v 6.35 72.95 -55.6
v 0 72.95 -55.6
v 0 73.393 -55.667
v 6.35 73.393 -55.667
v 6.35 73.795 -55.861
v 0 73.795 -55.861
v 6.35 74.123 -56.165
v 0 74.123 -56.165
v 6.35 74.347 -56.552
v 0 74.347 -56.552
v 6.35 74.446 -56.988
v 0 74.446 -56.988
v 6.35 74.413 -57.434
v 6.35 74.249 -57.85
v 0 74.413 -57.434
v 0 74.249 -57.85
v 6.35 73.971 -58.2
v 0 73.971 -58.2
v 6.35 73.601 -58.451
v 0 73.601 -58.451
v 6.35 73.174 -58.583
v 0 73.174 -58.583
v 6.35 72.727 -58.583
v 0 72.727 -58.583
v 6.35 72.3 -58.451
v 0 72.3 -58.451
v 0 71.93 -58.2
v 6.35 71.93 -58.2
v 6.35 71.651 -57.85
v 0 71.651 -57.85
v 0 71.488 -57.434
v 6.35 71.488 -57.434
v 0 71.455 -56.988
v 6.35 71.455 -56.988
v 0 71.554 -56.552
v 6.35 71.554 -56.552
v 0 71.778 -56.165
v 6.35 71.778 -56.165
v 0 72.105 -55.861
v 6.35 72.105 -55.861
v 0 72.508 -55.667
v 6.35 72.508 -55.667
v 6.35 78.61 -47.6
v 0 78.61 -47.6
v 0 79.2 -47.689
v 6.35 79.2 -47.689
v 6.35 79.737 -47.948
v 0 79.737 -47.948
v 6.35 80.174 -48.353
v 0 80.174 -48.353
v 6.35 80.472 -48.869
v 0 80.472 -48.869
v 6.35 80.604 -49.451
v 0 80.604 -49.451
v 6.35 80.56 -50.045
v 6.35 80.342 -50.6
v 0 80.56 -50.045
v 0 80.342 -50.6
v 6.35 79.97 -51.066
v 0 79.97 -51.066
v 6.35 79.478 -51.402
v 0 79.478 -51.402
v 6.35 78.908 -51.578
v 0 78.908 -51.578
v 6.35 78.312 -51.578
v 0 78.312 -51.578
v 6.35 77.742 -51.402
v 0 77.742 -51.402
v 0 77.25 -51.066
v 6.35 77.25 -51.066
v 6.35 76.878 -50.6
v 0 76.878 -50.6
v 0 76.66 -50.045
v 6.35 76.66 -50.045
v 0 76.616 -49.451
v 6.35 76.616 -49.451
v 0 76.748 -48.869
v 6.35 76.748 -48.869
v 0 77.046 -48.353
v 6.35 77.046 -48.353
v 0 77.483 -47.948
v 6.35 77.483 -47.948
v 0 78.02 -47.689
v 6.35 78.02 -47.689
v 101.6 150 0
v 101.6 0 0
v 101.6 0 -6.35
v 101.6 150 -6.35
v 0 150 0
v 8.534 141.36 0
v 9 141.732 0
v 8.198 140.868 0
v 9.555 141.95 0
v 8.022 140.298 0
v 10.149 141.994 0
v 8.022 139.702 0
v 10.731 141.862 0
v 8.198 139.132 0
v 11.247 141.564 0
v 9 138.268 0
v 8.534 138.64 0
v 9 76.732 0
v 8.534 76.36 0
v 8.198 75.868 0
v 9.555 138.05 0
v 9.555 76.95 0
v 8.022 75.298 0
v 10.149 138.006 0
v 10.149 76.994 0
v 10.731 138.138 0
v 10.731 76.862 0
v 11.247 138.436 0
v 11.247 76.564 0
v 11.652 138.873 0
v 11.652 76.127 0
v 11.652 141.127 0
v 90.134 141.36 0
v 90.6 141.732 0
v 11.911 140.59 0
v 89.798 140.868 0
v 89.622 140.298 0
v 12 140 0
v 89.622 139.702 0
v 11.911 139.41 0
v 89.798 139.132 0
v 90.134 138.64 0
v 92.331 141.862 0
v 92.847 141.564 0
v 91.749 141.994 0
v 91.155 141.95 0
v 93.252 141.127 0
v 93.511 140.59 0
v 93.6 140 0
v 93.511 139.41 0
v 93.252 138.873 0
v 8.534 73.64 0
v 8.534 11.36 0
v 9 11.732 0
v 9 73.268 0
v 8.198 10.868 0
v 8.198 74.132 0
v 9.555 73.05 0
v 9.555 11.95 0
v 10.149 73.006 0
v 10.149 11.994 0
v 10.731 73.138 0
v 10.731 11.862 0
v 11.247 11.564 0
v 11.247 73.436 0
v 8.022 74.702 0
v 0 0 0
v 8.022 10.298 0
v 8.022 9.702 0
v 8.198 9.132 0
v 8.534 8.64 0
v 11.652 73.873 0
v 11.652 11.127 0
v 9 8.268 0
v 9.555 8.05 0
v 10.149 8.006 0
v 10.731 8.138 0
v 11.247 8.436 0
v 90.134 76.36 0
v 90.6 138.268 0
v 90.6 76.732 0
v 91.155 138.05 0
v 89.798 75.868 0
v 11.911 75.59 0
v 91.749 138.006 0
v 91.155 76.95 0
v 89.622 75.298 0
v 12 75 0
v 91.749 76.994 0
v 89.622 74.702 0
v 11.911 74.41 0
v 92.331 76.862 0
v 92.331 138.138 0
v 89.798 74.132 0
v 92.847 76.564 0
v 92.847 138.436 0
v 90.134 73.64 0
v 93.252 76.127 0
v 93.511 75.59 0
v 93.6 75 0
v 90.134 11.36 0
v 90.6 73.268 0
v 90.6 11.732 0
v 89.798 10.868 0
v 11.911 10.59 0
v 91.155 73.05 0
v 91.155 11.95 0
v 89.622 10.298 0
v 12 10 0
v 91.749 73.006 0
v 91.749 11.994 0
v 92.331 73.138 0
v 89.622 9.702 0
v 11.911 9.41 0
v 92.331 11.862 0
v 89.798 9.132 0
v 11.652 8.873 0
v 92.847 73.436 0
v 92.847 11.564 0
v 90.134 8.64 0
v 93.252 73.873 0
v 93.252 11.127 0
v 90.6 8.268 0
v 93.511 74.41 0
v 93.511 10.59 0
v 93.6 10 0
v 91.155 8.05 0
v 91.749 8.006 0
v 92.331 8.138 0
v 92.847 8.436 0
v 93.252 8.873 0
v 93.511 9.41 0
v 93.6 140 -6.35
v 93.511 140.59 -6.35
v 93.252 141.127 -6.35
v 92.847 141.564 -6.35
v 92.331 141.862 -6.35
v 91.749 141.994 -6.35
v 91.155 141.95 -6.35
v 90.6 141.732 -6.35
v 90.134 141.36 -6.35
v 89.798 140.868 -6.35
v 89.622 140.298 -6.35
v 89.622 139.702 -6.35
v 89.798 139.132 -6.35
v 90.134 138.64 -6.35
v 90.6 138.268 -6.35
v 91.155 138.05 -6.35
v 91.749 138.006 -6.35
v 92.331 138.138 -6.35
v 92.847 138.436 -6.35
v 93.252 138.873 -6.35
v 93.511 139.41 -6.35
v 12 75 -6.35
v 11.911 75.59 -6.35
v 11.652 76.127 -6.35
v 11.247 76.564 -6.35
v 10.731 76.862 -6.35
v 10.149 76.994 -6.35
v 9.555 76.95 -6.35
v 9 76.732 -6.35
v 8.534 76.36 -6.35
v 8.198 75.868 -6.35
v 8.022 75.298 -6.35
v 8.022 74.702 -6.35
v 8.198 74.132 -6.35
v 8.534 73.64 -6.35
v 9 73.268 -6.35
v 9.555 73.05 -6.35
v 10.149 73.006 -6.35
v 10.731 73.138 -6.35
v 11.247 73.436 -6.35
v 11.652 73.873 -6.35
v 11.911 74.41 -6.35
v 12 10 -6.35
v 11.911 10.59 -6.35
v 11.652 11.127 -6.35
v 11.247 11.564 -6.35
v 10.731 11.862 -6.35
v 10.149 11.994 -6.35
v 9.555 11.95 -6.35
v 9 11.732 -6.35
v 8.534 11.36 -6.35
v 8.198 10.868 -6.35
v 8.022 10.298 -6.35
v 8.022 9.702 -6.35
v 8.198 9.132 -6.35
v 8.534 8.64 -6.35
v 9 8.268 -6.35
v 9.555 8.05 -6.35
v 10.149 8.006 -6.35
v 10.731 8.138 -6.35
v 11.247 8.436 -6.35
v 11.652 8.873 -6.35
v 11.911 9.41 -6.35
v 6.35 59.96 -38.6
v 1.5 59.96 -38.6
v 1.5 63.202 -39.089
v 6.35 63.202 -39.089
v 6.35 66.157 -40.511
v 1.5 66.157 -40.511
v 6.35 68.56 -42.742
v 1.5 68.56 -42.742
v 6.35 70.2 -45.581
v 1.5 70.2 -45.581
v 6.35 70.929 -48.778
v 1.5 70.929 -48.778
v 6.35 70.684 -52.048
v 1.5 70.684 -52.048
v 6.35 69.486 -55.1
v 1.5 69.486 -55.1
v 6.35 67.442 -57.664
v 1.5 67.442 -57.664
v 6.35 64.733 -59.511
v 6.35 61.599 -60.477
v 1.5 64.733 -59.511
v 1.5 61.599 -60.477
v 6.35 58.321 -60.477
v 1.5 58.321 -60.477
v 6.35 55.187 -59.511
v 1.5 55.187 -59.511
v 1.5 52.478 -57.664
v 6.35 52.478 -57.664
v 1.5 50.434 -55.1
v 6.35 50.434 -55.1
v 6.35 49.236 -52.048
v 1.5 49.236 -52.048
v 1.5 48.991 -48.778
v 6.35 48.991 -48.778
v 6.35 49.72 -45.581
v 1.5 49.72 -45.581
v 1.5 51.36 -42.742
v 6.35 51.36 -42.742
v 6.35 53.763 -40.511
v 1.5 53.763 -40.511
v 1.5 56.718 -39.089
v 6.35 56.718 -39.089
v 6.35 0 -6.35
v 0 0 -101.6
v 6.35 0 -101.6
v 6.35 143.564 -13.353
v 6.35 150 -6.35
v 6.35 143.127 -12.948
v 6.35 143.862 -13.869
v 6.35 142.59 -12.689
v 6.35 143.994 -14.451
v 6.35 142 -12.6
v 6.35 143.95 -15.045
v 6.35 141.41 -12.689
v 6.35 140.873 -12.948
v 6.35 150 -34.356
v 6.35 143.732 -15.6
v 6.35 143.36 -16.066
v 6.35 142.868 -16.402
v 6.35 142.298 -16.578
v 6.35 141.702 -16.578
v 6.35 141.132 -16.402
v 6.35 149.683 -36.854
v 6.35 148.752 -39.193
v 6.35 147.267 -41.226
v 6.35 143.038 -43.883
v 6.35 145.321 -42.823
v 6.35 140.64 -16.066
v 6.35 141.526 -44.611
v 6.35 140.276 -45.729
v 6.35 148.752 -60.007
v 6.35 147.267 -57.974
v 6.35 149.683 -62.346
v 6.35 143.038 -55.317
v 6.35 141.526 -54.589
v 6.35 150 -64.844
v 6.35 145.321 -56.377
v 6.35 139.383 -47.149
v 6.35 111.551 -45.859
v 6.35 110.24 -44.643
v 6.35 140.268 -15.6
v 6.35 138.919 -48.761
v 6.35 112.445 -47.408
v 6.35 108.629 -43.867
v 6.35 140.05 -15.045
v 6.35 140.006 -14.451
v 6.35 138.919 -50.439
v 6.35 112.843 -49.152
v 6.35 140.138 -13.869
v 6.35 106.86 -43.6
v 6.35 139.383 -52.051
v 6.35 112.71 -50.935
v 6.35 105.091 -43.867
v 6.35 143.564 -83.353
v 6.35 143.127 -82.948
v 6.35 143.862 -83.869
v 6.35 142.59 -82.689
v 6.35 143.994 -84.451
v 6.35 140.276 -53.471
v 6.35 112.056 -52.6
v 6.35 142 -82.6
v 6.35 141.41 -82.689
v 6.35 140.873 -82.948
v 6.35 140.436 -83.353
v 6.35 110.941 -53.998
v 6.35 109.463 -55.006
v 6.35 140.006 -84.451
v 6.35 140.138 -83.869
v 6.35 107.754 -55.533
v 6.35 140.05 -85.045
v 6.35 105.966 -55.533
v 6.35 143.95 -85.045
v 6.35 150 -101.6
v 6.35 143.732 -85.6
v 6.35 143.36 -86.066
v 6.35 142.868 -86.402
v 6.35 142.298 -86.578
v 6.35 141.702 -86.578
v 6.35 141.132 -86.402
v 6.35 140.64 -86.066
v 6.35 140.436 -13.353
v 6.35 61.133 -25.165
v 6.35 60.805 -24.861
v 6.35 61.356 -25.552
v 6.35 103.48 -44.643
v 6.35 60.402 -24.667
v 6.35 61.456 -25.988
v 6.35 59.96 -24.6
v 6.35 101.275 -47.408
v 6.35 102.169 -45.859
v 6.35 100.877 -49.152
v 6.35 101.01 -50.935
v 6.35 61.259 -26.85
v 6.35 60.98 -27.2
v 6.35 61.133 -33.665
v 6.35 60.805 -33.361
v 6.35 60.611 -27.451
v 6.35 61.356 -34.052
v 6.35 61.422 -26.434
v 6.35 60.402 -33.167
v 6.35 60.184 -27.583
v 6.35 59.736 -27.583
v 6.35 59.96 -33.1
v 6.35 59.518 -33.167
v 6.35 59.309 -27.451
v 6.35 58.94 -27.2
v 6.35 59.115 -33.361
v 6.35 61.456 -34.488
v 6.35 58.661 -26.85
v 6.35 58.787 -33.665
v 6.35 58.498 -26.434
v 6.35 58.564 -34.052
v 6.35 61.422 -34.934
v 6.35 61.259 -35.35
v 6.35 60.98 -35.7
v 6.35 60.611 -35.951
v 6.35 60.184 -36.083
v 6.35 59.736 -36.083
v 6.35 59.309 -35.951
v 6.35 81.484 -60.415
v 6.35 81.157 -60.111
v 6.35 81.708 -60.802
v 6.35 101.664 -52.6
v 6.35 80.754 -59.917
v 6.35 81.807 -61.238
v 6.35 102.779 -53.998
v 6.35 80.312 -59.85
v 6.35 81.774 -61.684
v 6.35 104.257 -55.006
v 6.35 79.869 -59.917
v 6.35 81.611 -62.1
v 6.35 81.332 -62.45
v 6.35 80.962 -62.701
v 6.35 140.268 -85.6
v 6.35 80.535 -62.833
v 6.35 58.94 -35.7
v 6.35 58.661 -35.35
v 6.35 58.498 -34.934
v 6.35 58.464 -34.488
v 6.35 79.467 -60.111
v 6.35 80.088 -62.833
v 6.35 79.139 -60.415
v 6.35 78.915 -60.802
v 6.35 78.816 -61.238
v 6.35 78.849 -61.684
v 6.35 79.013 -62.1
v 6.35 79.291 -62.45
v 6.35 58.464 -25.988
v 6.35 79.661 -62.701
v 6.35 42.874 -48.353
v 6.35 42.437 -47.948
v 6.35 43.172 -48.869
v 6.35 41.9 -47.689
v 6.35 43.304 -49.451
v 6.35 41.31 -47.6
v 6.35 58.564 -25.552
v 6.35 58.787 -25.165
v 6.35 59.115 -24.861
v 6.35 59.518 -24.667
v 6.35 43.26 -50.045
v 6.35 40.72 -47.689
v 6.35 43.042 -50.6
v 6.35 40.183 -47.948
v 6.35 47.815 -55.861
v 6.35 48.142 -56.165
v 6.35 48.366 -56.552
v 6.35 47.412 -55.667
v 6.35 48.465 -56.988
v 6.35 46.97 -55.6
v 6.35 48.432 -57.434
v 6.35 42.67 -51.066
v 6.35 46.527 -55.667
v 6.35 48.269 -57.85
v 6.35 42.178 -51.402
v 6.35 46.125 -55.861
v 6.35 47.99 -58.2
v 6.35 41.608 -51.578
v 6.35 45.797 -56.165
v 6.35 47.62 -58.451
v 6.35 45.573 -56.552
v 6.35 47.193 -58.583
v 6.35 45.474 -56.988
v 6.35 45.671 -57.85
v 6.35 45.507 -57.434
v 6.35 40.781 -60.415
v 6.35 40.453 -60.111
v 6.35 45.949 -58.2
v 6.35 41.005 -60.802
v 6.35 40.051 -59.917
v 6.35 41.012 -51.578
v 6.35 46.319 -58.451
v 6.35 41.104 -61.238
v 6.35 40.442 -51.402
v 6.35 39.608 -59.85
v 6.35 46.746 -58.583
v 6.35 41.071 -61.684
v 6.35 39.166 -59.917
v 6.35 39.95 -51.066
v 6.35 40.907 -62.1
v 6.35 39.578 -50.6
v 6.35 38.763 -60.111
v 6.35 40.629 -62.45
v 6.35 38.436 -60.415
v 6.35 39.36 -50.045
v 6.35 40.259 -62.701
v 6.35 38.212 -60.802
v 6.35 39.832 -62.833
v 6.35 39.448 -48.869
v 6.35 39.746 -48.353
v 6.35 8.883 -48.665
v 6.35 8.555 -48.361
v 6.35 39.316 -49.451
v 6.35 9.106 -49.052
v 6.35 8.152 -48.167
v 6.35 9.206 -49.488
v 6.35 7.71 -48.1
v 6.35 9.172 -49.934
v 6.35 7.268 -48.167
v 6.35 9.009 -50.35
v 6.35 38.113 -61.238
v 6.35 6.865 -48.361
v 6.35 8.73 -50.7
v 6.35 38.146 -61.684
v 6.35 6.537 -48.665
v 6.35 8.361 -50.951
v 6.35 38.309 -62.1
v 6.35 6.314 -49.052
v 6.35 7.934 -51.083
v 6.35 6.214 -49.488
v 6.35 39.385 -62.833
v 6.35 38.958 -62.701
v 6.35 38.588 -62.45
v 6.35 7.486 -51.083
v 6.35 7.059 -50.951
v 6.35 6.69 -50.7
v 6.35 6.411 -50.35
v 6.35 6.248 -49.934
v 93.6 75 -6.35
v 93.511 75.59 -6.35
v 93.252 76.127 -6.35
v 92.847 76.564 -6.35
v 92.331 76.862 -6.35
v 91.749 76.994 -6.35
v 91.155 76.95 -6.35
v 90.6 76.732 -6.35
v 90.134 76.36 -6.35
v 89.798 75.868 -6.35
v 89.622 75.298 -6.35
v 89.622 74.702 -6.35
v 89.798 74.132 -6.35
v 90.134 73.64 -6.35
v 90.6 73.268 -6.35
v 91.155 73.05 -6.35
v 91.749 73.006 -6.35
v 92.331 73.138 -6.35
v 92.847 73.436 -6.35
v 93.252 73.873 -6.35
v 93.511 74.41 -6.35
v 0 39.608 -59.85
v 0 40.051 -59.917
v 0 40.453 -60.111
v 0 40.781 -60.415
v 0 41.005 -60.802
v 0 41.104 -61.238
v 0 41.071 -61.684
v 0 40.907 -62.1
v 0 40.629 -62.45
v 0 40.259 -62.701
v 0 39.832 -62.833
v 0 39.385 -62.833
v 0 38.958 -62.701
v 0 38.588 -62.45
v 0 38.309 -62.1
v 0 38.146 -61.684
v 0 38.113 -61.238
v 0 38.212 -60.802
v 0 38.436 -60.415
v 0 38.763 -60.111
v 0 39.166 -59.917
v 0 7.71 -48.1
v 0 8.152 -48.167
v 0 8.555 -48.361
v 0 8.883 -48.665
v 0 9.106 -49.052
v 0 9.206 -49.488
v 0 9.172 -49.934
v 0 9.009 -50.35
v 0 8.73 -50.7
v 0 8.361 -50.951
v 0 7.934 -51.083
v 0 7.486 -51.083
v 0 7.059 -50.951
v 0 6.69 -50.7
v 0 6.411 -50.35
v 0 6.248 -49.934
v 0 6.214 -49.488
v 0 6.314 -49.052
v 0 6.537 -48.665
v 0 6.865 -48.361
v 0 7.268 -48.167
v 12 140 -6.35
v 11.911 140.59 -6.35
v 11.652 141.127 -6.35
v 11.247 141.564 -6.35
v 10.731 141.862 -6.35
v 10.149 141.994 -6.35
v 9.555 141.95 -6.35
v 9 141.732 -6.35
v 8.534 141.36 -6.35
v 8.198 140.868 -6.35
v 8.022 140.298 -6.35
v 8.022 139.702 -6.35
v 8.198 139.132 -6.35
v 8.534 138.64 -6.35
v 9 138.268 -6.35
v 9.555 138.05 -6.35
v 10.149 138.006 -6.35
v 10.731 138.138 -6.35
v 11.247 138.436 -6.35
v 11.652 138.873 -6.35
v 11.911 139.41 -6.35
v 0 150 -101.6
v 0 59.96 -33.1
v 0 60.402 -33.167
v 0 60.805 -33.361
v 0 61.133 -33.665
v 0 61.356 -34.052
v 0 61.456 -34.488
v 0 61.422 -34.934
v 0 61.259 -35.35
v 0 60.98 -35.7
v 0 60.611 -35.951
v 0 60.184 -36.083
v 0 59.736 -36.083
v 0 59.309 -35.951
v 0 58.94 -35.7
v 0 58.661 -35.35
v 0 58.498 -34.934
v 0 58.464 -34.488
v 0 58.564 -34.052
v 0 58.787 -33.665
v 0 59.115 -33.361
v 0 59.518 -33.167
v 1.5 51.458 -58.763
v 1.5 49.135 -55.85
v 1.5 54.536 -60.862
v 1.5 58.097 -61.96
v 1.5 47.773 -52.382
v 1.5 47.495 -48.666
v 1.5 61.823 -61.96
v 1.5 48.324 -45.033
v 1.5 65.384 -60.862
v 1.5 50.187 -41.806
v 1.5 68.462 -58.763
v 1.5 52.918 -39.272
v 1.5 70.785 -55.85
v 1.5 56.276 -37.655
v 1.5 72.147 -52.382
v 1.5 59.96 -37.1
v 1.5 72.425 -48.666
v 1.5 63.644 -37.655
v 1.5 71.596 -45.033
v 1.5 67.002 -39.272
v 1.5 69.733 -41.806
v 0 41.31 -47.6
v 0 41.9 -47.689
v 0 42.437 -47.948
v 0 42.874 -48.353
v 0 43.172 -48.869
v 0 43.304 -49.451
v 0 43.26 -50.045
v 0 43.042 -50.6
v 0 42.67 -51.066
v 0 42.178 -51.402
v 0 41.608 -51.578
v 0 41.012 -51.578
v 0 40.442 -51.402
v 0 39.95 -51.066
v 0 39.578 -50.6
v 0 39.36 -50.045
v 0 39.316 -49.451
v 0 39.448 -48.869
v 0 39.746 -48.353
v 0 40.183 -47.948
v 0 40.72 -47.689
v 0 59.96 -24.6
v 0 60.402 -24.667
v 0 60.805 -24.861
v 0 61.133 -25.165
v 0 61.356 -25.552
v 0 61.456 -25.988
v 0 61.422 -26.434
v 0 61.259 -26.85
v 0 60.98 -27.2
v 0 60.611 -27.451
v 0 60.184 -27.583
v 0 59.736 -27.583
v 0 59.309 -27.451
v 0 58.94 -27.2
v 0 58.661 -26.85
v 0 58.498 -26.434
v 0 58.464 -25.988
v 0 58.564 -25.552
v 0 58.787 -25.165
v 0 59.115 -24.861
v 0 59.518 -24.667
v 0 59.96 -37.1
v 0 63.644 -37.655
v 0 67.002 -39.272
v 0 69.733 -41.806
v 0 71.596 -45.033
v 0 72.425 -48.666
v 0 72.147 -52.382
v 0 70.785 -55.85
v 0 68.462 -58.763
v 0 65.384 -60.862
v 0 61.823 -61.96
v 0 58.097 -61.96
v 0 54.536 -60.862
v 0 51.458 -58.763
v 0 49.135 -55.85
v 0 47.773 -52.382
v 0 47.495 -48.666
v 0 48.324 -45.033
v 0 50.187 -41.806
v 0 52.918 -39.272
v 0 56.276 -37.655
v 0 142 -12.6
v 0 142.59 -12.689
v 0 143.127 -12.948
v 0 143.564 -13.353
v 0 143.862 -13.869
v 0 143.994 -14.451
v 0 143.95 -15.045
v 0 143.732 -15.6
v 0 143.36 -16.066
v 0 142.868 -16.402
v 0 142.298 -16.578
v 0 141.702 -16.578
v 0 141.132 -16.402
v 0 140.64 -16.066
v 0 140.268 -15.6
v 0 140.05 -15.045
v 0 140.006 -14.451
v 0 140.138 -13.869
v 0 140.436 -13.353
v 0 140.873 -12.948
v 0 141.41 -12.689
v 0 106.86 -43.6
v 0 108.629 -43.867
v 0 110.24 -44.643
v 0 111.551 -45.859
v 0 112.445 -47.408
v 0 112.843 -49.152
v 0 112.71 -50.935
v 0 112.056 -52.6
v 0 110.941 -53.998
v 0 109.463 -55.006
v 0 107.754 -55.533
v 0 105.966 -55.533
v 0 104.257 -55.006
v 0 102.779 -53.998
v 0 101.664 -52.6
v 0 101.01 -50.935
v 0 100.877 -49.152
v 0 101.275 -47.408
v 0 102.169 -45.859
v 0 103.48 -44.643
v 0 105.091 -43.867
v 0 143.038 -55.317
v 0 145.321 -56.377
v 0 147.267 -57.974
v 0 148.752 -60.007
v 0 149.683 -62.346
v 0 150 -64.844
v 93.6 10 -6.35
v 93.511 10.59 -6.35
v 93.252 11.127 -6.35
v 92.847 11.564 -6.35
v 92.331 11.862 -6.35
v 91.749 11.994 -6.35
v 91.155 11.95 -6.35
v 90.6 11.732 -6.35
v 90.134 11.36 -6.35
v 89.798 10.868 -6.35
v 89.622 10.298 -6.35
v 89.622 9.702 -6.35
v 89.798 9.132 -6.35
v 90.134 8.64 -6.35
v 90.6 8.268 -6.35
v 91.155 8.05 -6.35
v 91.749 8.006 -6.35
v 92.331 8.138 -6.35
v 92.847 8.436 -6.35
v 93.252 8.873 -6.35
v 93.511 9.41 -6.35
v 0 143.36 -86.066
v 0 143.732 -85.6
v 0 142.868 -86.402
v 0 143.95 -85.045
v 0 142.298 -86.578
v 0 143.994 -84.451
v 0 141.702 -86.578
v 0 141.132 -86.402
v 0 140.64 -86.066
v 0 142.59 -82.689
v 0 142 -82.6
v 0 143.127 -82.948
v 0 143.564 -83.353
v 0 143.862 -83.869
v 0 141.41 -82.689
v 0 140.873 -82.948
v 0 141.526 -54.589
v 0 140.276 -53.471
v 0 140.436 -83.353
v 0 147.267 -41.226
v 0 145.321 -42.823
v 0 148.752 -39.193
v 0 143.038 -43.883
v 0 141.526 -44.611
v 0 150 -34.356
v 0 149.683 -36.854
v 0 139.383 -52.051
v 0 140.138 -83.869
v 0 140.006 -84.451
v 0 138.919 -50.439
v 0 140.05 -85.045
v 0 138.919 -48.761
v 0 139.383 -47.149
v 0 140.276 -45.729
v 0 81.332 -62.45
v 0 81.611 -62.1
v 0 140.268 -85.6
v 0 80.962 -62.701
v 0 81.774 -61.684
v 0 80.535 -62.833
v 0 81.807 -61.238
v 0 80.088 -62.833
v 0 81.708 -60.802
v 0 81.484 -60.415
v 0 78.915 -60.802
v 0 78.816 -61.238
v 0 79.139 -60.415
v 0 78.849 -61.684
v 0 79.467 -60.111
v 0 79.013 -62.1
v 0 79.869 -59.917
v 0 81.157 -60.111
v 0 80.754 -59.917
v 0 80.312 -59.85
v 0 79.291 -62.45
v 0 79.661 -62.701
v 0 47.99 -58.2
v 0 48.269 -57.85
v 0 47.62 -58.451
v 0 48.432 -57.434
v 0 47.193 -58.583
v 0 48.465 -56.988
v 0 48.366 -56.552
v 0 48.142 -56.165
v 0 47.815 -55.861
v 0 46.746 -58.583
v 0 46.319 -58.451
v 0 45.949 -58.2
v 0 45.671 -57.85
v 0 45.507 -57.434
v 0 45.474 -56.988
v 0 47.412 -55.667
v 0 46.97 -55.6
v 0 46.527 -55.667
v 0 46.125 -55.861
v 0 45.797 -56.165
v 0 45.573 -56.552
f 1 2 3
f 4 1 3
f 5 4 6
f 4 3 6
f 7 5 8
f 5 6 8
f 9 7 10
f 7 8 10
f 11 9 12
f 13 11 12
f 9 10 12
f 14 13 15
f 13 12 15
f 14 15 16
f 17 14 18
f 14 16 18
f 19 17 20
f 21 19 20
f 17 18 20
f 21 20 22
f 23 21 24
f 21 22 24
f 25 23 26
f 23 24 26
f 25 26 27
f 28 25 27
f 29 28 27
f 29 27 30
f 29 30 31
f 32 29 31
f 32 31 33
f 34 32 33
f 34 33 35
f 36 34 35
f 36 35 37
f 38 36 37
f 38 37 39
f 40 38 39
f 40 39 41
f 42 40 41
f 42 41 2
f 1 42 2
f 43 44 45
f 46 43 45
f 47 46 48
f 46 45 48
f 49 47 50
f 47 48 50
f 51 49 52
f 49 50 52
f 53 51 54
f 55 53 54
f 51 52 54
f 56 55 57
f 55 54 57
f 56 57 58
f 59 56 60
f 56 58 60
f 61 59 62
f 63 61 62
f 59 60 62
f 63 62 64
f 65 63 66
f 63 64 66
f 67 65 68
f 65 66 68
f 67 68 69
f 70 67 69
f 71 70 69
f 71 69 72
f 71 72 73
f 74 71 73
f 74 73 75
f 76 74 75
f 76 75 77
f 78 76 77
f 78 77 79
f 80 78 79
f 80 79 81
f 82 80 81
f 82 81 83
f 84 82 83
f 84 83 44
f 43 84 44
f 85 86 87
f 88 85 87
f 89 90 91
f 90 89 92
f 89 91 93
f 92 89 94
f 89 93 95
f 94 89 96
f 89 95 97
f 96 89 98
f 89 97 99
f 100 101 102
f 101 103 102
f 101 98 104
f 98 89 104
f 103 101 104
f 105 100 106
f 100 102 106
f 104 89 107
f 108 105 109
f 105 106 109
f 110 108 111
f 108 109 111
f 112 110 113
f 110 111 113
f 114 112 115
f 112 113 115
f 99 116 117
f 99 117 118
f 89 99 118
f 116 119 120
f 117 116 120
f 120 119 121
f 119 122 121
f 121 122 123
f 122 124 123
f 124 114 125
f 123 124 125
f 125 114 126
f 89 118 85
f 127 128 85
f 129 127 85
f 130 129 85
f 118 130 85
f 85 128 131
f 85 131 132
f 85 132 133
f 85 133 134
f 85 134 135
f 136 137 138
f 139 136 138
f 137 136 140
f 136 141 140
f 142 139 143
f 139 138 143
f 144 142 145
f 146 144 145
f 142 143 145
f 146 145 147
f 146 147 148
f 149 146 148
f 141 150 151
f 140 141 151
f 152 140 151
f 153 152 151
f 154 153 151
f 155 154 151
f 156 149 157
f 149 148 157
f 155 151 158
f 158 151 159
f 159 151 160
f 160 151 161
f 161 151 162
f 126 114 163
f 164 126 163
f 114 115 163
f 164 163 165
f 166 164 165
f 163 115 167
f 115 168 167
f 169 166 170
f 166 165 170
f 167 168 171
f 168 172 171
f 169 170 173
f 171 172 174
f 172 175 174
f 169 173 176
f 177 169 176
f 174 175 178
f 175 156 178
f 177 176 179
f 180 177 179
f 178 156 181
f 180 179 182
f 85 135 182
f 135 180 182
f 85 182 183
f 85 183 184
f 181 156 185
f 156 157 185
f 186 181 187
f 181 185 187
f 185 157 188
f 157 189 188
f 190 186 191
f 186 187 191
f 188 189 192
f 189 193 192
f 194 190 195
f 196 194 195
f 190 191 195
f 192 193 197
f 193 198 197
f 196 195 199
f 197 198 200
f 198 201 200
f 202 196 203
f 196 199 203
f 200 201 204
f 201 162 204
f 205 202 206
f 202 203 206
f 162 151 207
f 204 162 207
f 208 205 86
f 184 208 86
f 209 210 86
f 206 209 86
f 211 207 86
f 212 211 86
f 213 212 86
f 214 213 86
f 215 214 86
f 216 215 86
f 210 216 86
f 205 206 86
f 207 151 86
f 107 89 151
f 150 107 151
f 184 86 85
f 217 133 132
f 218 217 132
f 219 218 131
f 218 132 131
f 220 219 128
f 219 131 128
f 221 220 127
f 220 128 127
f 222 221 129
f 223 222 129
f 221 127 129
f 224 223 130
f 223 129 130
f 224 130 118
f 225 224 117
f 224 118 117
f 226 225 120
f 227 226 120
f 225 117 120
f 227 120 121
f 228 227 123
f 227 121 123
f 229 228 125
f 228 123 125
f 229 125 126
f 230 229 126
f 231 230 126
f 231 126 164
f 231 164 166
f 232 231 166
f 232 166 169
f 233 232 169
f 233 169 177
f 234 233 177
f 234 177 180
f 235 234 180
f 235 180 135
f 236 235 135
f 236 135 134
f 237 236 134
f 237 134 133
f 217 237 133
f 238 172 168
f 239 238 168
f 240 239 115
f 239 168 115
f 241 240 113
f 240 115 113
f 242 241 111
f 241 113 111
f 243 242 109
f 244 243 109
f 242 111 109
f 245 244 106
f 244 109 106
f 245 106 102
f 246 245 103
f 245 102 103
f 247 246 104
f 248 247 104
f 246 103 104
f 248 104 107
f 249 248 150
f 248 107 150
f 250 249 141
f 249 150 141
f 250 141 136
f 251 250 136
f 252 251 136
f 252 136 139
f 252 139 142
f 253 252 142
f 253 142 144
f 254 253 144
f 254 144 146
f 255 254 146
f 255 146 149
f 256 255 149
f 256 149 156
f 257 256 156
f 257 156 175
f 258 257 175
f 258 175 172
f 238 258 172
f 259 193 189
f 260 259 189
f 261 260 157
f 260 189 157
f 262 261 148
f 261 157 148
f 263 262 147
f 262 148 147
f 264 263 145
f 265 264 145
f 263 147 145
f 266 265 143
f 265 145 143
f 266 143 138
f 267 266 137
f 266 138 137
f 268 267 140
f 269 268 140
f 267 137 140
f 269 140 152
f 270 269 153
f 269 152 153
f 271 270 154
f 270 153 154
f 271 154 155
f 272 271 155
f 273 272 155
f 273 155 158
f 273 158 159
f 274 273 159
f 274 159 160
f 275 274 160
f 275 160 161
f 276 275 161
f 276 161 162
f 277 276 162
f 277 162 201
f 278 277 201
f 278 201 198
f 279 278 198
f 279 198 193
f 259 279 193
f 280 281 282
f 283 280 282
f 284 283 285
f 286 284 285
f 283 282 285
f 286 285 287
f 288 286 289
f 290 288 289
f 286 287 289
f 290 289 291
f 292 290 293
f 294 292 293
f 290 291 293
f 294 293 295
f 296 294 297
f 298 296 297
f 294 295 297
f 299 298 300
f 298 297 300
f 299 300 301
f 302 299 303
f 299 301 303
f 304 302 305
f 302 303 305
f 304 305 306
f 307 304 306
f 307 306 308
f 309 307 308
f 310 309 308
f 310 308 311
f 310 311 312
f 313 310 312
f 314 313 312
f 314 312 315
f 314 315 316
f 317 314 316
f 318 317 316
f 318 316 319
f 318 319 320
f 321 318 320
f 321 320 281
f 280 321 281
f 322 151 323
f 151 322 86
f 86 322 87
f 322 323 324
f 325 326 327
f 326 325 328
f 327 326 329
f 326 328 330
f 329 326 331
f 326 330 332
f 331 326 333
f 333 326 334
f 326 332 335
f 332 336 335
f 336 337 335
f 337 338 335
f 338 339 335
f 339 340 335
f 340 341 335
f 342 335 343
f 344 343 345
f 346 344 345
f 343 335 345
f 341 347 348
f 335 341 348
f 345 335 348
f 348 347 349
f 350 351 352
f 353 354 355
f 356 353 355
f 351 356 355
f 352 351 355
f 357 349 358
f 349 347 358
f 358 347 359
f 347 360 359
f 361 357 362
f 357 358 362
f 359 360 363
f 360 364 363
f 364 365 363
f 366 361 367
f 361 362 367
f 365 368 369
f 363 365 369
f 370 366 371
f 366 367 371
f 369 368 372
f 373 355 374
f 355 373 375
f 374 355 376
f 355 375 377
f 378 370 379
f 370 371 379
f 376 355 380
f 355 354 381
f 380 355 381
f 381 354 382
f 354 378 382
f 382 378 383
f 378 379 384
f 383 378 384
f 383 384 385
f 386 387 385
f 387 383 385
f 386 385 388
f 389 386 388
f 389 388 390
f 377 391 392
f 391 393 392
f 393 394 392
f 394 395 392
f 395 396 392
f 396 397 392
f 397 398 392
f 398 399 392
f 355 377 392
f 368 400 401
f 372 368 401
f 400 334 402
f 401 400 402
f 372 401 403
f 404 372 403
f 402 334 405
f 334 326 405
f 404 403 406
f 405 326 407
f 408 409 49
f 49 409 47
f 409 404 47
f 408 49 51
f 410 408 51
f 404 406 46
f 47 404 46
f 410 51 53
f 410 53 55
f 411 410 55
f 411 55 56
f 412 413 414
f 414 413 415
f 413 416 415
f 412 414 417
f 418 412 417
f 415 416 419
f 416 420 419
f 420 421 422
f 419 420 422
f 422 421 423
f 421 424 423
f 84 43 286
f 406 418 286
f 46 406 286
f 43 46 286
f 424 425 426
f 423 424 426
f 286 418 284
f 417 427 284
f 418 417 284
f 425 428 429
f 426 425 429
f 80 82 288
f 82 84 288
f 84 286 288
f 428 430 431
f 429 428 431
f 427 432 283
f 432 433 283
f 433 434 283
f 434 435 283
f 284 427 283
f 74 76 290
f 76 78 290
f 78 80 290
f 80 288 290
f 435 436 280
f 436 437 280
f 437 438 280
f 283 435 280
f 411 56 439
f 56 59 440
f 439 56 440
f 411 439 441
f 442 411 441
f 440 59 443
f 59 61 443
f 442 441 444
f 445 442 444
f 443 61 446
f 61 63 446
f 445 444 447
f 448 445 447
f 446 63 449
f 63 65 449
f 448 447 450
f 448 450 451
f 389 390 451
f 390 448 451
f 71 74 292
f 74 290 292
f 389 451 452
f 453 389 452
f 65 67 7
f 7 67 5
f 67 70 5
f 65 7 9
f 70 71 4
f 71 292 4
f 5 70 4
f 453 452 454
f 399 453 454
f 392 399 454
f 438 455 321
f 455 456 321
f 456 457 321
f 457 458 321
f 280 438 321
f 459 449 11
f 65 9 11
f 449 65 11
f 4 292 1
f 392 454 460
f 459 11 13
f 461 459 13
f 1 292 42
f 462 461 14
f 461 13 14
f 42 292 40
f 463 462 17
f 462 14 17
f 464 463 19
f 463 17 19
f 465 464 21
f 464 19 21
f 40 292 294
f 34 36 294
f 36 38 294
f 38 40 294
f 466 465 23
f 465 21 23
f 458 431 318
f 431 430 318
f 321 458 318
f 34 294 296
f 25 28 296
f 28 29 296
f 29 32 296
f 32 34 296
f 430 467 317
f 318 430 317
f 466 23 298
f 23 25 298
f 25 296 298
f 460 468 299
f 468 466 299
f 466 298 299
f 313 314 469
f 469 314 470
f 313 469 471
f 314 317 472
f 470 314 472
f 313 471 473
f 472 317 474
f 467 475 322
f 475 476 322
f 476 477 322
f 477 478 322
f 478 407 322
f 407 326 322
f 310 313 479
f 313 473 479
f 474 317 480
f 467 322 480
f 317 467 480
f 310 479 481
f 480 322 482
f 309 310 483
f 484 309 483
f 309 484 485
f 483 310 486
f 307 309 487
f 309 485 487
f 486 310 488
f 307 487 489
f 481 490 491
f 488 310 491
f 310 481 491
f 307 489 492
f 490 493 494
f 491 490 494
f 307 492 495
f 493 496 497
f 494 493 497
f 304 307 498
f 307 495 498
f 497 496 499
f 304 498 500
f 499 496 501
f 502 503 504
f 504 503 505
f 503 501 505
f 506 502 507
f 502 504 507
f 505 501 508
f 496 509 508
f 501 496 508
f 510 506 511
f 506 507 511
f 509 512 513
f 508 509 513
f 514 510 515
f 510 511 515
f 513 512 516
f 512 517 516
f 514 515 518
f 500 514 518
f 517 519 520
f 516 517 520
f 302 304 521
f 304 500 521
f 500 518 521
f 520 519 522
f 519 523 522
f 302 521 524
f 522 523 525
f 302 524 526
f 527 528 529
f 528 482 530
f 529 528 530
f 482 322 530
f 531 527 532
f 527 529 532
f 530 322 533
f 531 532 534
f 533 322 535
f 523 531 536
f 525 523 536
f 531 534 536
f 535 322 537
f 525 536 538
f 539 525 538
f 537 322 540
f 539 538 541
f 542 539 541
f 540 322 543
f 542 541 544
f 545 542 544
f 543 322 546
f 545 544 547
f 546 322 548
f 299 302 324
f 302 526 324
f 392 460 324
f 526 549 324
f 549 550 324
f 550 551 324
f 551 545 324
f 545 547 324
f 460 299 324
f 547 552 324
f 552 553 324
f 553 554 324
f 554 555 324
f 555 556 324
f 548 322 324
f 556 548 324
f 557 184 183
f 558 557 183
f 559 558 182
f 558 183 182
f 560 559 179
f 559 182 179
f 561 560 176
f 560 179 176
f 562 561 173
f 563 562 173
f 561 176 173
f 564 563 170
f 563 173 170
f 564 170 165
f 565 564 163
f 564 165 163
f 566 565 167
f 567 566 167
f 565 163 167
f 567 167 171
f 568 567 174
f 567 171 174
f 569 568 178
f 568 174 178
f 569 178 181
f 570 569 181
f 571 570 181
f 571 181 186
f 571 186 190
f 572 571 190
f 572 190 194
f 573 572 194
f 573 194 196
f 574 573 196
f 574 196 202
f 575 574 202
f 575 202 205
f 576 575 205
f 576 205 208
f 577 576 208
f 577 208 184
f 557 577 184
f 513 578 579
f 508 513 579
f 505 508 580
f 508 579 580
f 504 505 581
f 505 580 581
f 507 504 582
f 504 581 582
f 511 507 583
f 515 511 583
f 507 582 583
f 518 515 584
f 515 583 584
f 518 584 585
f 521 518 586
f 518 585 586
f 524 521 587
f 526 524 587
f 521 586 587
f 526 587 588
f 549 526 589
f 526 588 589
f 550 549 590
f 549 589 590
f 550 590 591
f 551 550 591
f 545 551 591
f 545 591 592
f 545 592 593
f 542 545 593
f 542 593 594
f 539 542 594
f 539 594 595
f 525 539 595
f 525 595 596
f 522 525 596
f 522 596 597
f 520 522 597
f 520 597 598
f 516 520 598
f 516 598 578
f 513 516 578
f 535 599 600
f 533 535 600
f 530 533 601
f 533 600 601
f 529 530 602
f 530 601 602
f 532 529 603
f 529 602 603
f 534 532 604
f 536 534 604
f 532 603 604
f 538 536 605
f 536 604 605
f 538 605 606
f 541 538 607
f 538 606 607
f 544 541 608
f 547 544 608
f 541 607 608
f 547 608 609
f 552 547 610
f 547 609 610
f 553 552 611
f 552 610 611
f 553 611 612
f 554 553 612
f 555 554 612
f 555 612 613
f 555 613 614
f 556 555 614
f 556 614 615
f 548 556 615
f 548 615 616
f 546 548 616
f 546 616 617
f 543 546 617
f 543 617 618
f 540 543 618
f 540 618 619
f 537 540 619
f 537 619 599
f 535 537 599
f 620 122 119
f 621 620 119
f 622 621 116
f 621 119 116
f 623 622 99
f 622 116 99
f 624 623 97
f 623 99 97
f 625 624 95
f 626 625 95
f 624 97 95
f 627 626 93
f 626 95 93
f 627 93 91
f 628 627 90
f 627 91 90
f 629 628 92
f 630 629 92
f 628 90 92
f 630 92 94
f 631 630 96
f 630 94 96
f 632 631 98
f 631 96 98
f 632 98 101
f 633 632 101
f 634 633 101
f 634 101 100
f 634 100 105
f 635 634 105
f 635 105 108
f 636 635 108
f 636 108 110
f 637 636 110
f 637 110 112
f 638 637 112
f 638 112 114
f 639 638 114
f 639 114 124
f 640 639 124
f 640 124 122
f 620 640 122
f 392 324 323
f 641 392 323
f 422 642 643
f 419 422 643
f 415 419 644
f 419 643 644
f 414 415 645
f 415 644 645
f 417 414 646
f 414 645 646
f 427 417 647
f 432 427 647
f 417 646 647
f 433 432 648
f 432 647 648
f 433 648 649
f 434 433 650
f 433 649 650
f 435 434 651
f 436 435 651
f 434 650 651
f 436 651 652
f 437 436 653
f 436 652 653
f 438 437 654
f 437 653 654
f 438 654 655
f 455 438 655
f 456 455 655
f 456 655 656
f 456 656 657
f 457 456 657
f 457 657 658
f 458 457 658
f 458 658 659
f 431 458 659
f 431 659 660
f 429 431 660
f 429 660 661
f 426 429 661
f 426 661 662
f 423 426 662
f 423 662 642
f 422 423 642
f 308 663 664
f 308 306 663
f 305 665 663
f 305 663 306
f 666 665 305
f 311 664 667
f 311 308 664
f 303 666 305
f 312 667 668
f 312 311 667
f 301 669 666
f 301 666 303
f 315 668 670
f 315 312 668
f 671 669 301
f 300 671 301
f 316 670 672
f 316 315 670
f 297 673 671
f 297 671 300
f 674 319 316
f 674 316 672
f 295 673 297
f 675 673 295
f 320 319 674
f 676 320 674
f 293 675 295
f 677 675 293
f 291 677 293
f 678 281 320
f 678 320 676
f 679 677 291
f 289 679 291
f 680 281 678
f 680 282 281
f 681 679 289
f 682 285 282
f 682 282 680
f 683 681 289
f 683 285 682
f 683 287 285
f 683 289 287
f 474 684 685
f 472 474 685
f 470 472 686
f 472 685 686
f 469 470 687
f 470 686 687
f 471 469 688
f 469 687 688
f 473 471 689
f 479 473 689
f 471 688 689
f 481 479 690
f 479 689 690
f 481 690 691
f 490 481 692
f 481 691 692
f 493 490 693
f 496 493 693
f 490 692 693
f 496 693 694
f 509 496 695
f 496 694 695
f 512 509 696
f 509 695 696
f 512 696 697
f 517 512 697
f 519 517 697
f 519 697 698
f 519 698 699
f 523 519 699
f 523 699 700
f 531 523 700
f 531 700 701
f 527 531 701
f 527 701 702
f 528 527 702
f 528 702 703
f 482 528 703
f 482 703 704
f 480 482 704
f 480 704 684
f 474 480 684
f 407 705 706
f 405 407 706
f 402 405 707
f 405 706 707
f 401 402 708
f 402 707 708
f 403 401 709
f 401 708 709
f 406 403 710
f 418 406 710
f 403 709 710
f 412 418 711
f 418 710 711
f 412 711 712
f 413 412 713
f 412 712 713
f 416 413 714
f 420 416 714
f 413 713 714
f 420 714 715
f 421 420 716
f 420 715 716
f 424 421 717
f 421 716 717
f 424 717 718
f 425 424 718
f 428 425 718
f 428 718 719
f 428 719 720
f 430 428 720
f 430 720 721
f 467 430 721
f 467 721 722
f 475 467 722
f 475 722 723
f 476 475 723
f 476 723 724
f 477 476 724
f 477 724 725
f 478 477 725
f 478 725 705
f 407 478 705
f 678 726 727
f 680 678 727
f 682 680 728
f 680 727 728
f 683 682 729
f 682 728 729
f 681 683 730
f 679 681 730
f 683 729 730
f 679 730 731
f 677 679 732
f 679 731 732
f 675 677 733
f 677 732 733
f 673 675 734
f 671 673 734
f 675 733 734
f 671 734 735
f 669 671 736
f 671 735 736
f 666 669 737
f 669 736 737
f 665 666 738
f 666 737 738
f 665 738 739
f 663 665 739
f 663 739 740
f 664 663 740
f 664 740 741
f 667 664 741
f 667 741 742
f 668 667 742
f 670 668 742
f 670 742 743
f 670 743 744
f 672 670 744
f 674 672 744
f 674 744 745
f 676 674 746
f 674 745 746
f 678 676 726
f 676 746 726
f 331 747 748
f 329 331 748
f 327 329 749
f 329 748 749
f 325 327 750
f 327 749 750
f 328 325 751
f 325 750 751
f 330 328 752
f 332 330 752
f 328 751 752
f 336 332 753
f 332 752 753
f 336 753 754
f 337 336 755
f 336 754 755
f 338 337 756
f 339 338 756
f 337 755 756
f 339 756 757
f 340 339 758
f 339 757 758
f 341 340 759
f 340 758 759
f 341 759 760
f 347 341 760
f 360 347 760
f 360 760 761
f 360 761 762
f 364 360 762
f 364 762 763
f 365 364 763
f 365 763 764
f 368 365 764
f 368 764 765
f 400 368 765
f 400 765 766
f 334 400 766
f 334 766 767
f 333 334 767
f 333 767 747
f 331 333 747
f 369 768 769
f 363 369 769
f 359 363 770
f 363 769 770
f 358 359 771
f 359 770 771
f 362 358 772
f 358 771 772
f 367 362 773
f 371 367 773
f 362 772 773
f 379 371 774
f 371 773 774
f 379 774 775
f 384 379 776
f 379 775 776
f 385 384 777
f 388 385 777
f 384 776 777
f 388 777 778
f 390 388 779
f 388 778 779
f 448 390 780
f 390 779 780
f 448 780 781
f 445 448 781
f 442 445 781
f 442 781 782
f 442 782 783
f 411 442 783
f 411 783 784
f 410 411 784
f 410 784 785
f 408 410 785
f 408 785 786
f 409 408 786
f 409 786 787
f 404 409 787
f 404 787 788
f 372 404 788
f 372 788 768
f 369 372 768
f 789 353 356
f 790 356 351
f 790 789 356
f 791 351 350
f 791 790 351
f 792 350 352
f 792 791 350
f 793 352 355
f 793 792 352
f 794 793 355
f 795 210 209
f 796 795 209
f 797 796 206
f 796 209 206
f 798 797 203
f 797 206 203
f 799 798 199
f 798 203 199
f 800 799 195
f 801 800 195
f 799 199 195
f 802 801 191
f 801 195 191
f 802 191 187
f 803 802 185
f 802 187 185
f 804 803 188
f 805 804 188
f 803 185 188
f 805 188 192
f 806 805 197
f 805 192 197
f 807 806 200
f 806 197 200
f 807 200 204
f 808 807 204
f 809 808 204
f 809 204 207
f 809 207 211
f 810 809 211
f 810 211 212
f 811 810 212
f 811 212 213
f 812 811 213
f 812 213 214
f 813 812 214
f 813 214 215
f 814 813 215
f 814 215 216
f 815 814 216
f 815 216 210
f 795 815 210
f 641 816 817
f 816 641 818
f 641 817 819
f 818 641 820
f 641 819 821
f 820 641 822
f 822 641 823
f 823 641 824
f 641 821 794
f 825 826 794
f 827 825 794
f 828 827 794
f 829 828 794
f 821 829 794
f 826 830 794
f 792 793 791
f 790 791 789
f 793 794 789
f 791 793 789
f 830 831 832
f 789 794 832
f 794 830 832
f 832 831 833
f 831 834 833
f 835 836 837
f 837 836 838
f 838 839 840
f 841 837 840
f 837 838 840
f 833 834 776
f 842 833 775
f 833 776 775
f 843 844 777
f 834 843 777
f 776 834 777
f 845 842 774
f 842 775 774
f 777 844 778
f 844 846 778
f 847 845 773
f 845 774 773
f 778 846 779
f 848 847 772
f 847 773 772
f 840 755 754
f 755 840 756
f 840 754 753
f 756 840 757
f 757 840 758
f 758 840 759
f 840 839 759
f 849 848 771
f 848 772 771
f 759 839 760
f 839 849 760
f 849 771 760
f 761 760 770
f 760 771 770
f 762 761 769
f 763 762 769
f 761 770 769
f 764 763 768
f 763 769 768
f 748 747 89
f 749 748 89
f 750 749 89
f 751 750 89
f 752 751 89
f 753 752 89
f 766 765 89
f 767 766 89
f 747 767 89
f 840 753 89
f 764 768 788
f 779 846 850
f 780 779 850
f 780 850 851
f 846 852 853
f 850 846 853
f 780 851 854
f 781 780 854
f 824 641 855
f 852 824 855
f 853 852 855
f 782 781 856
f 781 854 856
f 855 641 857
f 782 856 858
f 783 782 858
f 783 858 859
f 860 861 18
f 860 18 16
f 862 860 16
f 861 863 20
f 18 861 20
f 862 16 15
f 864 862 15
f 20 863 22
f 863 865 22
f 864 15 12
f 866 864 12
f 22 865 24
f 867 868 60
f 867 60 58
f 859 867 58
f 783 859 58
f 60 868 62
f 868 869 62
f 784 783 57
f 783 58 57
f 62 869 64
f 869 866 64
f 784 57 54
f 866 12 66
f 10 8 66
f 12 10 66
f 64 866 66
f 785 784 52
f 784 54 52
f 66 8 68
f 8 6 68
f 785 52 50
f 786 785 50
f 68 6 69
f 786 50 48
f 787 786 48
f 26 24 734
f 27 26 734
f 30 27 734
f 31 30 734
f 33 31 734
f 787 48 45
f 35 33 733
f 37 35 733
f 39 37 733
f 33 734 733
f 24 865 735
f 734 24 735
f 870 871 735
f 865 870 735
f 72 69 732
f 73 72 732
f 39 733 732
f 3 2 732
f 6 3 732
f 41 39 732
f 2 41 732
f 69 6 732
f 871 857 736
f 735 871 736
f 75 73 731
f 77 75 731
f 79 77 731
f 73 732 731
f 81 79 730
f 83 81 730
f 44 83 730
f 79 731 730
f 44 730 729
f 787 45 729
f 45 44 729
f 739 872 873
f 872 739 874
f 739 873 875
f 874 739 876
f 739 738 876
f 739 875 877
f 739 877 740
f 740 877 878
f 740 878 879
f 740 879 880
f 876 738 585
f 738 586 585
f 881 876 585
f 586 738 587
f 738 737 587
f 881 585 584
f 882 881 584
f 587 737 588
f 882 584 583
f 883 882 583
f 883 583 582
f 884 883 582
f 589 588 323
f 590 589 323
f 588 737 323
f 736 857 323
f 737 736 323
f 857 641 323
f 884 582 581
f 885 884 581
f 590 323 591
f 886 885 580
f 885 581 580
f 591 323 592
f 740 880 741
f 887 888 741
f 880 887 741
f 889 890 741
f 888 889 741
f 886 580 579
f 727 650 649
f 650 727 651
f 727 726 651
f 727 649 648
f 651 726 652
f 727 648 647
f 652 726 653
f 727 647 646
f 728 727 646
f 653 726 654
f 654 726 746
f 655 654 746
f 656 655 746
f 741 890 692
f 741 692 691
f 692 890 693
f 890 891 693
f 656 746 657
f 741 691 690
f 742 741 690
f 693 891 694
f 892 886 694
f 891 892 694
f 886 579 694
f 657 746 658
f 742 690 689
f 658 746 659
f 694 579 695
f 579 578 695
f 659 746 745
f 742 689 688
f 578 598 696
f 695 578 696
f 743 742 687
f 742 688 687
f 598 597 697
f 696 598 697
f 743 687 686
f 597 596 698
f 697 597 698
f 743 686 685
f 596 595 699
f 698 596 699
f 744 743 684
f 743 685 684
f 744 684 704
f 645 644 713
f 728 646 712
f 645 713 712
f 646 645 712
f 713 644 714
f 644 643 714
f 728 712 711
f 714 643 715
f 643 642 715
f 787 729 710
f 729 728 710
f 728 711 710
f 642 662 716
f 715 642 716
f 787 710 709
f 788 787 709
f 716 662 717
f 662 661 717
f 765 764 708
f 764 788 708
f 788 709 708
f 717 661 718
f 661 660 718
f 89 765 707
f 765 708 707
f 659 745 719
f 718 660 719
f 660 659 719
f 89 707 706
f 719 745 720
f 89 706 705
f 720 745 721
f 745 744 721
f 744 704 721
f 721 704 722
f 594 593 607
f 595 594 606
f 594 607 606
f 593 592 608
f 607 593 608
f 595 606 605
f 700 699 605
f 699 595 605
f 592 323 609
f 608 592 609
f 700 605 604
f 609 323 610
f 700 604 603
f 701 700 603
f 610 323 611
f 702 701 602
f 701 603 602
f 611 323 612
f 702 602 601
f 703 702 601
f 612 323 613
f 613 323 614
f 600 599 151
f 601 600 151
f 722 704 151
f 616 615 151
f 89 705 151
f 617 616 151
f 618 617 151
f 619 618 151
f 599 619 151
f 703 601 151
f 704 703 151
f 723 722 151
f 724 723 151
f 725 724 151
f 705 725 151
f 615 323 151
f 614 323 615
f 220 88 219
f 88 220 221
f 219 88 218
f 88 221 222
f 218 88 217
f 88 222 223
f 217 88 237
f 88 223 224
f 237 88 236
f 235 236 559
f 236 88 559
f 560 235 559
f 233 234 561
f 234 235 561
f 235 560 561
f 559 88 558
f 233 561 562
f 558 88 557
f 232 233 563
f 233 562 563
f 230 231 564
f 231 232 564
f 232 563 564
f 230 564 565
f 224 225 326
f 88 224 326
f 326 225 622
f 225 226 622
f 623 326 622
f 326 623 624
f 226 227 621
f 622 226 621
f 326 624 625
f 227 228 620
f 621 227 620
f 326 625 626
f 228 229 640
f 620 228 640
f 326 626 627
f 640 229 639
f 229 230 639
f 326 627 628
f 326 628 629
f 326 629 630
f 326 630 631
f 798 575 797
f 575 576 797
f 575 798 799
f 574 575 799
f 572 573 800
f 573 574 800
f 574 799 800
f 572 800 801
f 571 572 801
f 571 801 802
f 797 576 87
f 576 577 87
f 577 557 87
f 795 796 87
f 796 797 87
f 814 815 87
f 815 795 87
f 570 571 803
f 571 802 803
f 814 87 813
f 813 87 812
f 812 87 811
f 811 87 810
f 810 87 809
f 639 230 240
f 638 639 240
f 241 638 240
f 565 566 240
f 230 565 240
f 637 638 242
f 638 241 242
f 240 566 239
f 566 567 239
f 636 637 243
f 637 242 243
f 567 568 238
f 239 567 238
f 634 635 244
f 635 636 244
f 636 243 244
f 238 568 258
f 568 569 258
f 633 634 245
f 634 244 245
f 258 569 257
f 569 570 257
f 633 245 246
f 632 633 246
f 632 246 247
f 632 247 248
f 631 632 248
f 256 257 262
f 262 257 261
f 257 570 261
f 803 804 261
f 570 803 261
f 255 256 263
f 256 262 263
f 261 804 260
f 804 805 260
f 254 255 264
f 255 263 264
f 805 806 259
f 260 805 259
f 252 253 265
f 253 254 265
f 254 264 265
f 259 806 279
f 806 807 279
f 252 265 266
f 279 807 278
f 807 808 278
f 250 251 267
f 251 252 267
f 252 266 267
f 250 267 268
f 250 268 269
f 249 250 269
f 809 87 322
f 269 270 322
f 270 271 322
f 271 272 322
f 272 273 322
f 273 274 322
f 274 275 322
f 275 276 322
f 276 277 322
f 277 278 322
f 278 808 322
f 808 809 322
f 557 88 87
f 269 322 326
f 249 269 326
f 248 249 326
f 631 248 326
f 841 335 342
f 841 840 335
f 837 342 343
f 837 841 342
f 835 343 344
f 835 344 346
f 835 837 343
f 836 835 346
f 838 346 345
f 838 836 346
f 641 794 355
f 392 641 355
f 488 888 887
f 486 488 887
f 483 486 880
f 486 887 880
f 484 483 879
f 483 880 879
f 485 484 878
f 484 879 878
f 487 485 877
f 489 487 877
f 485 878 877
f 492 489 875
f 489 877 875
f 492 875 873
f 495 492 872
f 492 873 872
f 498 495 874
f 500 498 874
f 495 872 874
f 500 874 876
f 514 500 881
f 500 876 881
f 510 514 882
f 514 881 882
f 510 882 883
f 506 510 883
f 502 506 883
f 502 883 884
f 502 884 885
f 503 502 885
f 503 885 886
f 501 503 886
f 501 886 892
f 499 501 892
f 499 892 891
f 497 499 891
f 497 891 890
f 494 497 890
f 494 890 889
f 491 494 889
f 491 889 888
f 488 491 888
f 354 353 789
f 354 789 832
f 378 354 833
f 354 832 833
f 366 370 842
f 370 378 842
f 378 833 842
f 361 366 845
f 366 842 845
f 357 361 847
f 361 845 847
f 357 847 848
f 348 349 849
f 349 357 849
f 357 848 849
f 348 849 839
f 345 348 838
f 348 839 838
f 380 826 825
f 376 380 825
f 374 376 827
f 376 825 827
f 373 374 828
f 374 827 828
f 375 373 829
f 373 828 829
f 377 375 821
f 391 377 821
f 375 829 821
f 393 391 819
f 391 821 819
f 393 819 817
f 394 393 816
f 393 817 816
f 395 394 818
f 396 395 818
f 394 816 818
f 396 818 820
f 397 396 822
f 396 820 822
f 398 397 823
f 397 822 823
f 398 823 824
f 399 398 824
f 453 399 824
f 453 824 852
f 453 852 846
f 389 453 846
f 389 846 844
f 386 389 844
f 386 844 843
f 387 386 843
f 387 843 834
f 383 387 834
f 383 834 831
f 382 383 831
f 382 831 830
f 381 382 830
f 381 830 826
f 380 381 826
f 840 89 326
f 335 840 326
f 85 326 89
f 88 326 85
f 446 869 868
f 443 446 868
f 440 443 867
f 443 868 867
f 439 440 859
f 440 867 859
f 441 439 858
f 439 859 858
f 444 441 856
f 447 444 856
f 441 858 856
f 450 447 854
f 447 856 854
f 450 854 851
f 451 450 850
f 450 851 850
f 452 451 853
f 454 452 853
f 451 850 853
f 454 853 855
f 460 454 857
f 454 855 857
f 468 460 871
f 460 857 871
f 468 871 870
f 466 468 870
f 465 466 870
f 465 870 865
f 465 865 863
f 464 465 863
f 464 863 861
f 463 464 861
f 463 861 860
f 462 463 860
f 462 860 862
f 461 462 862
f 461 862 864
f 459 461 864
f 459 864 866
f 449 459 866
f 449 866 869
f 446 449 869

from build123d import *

# Parameters (mm, degrees)
SALIENTE_EXTRUIR1_DEPTH = 150
CROQUIS2_R              = 2
CROQUIS2_R_2            = 11
CROQUIS2_R_3            = 1.5
CROQUIS2_R_4            = 6
CORTAR_EXTRUIR1_DEPTH   = 208.714034191
REDONDEO1_R             = 10
CROQUIS3_R              = 12.5
CORTAR_EXTRUIR2_DEPTH   = 1.5
CROQUIS4_R              = 2
CROQUIS4_R_2            = 1.5
CORTAR_EXTRUIR3_DEPTH   = 208.714034191
CROQUIS6_R              = 2
CORTAR_EXTRUIR4_DEPTH   = 208.714034191


with BuildPart() as part:
    # Croquis1 → Saliente-Extruir1 (new body)
    with BuildSketch(Plane(origin=(0, 0, 0), x_dir=(1, 0, 0), z_dir=(0, 1, 0))):
        Polygon((0, 101.6), (0, 0), (101.6, 0), (101.6, 6.35), (6.35, 6.35), (6.35, 101.6), align=None)
    extrude(amount=SALIENTE_EXTRUIR1_DEPTH)

    # Croquis2 → Cortar-Extruir1 (cut, through all)
    with BuildSketch(Plane.ZY):
        with Locations((-84.6, 142)):
            Circle(CROQUIS2_R)
        with Locations((-14.6, 142)):
            Circle(CROQUIS2_R)
        with Locations((-49.6, 59.96)):
            Circle(CROQUIS2_R_2)
        with Locations((-49.6, 7.71)):
            Circle(CROQUIS2_R_3)
        with Locations((-49.6, 144.86)):
            Circle(CROQUIS2_R_4)
        with Locations((-49.6, 106.86)):
            Circle(CROQUIS2_R_4)
    extrude(amount=-CORTAR_EXTRUIR1_DEPTH, mode=Mode.SUBTRACT)

    # Redondeo1
    redondeo1_edges = [part.edges().sort_by_distance(p)[0] for p in [
        (3.175, 150, -52.695222125),
        (3.175, 150, -46.504777875),
    ]]
    fillet(redondeo1_edges, radius=REDONDEO1_R)

    # Croquis3 → Cortar-Extruir2 (cut)
    with BuildSketch(Plane.ZY):
        with Locations((-49.6, 59.96)):
            Circle(CROQUIS3_R)
    extrude(amount=-CORTAR_EXTRUIR2_DEPTH, mode=Mode.SUBTRACT)

    # Croquis4 → Cortar-Extruir3 (cut, through all)
    with BuildSketch(Plane.ZY):
        with Locations((-49.6, 78.61)):
            Circle(CROQUIS4_R)
        with Locations((-49.6, 41.31)):
            Circle(CROQUIS4_R)
        with Locations((-34.6, 59.96)):
            Circle(CROQUIS4_R_2)
        with Locations((-57.1, 46.969618943)):
            Circle(CROQUIS4_R_2)
        with Locations((-57.1, 72.950381057)):
            Circle(CROQUIS4_R_2)
        with Locations((-26.1, 59.96)):
            Circle(CROQUIS4_R_2)
        with Locations((-61.35, 39.608403011)):
            Circle(CROQUIS4_R_2)
        with Locations((-61.35, 80.311596989)):
            Circle(CROQUIS4_R_2)
    extrude(amount=-CORTAR_EXTRUIR3_DEPTH, mode=Mode.SUBTRACT)

    # Croquis6 → Cortar-Extruir4 (cut, through all)
    with BuildSketch(Plane.XY):
        with Locations((91.6, 140)):
            Circle(CROQUIS6_R)
        with Locations((91.6, 75)):
            Circle(CROQUIS6_R)
        with Locations((91.6, 10)):
            Circle(CROQUIS6_R)
        with Locations((10, 10)):
            Circle(CROQUIS6_R)
        with Locations((10, 75)):
            Circle(CROQUIS6_R)
        with Locations((10, 140)):
            Circle(CROQUIS6_R)
    extrude(amount=-CORTAR_EXTRUIR4_DEPTH, mode=Mode.SUBTRACT)


solid = part.part
